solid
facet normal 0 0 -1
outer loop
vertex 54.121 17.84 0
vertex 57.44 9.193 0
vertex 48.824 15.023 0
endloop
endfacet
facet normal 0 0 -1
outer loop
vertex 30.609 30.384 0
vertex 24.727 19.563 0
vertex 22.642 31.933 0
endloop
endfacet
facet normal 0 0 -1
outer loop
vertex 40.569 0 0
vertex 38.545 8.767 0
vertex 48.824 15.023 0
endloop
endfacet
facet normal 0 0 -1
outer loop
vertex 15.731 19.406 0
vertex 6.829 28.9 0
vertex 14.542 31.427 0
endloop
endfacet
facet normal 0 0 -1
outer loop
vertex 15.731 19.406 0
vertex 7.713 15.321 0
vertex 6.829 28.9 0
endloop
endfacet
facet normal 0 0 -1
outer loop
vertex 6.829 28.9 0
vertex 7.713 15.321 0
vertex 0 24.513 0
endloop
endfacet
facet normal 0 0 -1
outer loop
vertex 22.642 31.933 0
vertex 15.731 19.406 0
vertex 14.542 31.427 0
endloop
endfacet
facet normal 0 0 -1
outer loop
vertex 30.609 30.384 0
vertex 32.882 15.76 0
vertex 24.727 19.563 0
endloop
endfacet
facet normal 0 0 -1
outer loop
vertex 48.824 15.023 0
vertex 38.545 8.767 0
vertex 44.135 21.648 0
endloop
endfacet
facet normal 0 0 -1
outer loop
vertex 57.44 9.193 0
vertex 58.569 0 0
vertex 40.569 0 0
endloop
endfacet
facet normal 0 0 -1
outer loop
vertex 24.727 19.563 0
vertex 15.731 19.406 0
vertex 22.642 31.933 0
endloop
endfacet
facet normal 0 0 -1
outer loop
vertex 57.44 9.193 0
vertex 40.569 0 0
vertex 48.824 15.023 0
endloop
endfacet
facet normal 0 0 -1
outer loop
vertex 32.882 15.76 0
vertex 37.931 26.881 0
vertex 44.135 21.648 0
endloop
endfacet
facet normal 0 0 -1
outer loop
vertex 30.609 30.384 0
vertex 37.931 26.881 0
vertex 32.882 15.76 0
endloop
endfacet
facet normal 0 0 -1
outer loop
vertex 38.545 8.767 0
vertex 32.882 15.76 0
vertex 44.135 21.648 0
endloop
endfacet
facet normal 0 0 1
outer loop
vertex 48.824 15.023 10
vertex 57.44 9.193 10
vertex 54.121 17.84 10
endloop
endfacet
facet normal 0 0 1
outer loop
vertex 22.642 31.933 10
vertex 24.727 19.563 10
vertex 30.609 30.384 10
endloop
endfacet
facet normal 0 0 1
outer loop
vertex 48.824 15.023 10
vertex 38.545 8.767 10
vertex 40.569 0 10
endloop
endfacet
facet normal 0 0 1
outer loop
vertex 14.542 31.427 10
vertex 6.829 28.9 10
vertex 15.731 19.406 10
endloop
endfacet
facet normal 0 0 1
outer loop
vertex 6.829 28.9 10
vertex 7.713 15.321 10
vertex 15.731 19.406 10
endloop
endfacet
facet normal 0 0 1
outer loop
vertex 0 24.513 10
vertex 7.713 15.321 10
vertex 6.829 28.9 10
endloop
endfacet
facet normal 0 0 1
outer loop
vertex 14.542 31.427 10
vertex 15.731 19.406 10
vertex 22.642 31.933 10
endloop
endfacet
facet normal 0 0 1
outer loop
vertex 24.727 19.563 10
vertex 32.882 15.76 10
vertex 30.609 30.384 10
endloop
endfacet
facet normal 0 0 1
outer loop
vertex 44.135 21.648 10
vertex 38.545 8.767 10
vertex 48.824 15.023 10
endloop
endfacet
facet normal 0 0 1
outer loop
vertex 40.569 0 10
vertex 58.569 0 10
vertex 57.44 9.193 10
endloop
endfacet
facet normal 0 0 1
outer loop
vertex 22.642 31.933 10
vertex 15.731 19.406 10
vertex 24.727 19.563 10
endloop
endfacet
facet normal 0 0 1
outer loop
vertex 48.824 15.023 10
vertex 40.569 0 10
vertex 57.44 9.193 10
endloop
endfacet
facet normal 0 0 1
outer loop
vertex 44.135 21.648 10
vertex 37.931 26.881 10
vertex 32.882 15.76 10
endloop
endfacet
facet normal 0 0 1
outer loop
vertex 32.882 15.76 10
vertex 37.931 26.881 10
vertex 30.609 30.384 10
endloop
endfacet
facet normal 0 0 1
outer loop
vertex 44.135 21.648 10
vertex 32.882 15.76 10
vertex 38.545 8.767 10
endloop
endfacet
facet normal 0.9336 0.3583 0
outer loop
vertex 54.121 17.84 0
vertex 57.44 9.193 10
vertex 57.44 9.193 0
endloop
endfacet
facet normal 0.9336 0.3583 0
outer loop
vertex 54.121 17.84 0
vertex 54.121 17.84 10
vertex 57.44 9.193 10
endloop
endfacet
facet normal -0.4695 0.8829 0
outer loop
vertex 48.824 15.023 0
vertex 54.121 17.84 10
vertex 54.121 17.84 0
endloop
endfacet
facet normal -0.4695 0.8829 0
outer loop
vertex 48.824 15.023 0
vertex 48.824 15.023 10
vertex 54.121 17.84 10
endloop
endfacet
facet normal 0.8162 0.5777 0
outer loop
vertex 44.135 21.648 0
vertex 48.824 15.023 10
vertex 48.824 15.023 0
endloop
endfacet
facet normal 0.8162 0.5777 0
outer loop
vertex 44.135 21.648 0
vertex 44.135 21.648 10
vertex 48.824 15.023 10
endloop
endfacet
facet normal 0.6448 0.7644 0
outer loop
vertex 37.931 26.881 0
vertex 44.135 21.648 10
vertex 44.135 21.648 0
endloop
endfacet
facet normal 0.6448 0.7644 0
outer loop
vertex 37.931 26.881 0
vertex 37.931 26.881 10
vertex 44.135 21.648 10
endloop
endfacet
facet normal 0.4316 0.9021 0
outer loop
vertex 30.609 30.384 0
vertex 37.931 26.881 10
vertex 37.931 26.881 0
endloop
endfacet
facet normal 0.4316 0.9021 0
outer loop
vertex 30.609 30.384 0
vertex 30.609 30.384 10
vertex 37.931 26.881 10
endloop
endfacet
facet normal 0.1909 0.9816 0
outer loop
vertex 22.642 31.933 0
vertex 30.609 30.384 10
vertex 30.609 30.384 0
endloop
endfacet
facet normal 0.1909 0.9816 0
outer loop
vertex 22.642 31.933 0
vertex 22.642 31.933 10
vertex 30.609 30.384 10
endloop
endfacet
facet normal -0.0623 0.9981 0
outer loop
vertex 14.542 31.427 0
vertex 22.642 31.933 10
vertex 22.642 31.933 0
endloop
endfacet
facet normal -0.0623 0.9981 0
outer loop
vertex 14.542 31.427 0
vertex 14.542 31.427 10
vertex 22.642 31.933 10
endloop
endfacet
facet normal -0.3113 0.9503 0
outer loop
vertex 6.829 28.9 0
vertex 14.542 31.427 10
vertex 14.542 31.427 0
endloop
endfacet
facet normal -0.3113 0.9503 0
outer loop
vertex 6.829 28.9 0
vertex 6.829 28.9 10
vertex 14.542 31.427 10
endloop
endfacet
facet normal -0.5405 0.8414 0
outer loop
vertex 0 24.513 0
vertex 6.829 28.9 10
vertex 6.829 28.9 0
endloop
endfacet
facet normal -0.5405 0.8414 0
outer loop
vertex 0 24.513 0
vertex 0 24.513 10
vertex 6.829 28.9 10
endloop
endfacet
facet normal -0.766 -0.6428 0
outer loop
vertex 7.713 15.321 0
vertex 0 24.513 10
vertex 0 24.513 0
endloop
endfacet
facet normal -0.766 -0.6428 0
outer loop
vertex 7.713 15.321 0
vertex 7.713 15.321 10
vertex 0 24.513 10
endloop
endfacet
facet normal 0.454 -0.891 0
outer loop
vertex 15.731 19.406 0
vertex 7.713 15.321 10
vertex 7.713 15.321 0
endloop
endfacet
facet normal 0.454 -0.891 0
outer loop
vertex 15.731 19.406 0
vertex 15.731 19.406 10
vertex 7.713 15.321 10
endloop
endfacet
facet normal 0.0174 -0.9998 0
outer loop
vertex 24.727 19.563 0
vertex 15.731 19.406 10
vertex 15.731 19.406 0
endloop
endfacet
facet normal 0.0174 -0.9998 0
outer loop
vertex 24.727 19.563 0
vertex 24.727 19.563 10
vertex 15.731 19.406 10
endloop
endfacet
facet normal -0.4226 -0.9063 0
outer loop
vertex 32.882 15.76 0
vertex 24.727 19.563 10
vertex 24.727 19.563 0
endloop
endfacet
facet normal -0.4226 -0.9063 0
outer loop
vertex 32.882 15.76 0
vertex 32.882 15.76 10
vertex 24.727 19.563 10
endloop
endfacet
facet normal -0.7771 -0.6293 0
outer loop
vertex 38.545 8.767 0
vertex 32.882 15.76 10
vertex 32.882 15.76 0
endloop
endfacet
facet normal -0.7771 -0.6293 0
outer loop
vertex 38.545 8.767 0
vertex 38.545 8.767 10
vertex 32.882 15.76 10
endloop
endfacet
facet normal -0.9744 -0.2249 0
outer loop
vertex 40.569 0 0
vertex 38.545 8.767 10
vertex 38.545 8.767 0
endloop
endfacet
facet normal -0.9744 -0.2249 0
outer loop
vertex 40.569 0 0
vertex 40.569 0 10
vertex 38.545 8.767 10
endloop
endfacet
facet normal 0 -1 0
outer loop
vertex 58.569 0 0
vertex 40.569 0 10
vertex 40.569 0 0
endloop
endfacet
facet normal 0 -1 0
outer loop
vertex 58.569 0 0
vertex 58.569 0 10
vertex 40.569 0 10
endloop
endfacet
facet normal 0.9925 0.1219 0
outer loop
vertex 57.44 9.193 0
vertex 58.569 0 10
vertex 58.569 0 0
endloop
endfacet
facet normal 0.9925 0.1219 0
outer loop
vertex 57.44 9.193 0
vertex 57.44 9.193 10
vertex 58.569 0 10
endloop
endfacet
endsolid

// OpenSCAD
$fn = 32;

// ----------------------------------------------------------------------
// Arc stop: segment, 10 mm thick
// ----------------------------------------------------------------------

// --- parameters (mm) ---
profile_height = 10;      // extrusion height
profile_points = 17;      // points of the closed outline

profile = [[58.569, 0], [57.44, 9.193], [54.121, 17.84], [48.824, 15.023], [44.135, 21.648], [37.931, 26.881], [30.609, 30.384], [22.642, 31.933], [14.542, 31.427], [6.829, 28.9], [0, 24.513], [7.713, 15.321], [15.731, 19.406], [24.727, 19.563], [32.882, 15.76], [38.545, 8.767], [40.569, 0]];  // single closed polygon, 17 points, counter clockwise

// --- the one profile operation ---
linear_extrude(height = profile_height) polygon(points = profile);
